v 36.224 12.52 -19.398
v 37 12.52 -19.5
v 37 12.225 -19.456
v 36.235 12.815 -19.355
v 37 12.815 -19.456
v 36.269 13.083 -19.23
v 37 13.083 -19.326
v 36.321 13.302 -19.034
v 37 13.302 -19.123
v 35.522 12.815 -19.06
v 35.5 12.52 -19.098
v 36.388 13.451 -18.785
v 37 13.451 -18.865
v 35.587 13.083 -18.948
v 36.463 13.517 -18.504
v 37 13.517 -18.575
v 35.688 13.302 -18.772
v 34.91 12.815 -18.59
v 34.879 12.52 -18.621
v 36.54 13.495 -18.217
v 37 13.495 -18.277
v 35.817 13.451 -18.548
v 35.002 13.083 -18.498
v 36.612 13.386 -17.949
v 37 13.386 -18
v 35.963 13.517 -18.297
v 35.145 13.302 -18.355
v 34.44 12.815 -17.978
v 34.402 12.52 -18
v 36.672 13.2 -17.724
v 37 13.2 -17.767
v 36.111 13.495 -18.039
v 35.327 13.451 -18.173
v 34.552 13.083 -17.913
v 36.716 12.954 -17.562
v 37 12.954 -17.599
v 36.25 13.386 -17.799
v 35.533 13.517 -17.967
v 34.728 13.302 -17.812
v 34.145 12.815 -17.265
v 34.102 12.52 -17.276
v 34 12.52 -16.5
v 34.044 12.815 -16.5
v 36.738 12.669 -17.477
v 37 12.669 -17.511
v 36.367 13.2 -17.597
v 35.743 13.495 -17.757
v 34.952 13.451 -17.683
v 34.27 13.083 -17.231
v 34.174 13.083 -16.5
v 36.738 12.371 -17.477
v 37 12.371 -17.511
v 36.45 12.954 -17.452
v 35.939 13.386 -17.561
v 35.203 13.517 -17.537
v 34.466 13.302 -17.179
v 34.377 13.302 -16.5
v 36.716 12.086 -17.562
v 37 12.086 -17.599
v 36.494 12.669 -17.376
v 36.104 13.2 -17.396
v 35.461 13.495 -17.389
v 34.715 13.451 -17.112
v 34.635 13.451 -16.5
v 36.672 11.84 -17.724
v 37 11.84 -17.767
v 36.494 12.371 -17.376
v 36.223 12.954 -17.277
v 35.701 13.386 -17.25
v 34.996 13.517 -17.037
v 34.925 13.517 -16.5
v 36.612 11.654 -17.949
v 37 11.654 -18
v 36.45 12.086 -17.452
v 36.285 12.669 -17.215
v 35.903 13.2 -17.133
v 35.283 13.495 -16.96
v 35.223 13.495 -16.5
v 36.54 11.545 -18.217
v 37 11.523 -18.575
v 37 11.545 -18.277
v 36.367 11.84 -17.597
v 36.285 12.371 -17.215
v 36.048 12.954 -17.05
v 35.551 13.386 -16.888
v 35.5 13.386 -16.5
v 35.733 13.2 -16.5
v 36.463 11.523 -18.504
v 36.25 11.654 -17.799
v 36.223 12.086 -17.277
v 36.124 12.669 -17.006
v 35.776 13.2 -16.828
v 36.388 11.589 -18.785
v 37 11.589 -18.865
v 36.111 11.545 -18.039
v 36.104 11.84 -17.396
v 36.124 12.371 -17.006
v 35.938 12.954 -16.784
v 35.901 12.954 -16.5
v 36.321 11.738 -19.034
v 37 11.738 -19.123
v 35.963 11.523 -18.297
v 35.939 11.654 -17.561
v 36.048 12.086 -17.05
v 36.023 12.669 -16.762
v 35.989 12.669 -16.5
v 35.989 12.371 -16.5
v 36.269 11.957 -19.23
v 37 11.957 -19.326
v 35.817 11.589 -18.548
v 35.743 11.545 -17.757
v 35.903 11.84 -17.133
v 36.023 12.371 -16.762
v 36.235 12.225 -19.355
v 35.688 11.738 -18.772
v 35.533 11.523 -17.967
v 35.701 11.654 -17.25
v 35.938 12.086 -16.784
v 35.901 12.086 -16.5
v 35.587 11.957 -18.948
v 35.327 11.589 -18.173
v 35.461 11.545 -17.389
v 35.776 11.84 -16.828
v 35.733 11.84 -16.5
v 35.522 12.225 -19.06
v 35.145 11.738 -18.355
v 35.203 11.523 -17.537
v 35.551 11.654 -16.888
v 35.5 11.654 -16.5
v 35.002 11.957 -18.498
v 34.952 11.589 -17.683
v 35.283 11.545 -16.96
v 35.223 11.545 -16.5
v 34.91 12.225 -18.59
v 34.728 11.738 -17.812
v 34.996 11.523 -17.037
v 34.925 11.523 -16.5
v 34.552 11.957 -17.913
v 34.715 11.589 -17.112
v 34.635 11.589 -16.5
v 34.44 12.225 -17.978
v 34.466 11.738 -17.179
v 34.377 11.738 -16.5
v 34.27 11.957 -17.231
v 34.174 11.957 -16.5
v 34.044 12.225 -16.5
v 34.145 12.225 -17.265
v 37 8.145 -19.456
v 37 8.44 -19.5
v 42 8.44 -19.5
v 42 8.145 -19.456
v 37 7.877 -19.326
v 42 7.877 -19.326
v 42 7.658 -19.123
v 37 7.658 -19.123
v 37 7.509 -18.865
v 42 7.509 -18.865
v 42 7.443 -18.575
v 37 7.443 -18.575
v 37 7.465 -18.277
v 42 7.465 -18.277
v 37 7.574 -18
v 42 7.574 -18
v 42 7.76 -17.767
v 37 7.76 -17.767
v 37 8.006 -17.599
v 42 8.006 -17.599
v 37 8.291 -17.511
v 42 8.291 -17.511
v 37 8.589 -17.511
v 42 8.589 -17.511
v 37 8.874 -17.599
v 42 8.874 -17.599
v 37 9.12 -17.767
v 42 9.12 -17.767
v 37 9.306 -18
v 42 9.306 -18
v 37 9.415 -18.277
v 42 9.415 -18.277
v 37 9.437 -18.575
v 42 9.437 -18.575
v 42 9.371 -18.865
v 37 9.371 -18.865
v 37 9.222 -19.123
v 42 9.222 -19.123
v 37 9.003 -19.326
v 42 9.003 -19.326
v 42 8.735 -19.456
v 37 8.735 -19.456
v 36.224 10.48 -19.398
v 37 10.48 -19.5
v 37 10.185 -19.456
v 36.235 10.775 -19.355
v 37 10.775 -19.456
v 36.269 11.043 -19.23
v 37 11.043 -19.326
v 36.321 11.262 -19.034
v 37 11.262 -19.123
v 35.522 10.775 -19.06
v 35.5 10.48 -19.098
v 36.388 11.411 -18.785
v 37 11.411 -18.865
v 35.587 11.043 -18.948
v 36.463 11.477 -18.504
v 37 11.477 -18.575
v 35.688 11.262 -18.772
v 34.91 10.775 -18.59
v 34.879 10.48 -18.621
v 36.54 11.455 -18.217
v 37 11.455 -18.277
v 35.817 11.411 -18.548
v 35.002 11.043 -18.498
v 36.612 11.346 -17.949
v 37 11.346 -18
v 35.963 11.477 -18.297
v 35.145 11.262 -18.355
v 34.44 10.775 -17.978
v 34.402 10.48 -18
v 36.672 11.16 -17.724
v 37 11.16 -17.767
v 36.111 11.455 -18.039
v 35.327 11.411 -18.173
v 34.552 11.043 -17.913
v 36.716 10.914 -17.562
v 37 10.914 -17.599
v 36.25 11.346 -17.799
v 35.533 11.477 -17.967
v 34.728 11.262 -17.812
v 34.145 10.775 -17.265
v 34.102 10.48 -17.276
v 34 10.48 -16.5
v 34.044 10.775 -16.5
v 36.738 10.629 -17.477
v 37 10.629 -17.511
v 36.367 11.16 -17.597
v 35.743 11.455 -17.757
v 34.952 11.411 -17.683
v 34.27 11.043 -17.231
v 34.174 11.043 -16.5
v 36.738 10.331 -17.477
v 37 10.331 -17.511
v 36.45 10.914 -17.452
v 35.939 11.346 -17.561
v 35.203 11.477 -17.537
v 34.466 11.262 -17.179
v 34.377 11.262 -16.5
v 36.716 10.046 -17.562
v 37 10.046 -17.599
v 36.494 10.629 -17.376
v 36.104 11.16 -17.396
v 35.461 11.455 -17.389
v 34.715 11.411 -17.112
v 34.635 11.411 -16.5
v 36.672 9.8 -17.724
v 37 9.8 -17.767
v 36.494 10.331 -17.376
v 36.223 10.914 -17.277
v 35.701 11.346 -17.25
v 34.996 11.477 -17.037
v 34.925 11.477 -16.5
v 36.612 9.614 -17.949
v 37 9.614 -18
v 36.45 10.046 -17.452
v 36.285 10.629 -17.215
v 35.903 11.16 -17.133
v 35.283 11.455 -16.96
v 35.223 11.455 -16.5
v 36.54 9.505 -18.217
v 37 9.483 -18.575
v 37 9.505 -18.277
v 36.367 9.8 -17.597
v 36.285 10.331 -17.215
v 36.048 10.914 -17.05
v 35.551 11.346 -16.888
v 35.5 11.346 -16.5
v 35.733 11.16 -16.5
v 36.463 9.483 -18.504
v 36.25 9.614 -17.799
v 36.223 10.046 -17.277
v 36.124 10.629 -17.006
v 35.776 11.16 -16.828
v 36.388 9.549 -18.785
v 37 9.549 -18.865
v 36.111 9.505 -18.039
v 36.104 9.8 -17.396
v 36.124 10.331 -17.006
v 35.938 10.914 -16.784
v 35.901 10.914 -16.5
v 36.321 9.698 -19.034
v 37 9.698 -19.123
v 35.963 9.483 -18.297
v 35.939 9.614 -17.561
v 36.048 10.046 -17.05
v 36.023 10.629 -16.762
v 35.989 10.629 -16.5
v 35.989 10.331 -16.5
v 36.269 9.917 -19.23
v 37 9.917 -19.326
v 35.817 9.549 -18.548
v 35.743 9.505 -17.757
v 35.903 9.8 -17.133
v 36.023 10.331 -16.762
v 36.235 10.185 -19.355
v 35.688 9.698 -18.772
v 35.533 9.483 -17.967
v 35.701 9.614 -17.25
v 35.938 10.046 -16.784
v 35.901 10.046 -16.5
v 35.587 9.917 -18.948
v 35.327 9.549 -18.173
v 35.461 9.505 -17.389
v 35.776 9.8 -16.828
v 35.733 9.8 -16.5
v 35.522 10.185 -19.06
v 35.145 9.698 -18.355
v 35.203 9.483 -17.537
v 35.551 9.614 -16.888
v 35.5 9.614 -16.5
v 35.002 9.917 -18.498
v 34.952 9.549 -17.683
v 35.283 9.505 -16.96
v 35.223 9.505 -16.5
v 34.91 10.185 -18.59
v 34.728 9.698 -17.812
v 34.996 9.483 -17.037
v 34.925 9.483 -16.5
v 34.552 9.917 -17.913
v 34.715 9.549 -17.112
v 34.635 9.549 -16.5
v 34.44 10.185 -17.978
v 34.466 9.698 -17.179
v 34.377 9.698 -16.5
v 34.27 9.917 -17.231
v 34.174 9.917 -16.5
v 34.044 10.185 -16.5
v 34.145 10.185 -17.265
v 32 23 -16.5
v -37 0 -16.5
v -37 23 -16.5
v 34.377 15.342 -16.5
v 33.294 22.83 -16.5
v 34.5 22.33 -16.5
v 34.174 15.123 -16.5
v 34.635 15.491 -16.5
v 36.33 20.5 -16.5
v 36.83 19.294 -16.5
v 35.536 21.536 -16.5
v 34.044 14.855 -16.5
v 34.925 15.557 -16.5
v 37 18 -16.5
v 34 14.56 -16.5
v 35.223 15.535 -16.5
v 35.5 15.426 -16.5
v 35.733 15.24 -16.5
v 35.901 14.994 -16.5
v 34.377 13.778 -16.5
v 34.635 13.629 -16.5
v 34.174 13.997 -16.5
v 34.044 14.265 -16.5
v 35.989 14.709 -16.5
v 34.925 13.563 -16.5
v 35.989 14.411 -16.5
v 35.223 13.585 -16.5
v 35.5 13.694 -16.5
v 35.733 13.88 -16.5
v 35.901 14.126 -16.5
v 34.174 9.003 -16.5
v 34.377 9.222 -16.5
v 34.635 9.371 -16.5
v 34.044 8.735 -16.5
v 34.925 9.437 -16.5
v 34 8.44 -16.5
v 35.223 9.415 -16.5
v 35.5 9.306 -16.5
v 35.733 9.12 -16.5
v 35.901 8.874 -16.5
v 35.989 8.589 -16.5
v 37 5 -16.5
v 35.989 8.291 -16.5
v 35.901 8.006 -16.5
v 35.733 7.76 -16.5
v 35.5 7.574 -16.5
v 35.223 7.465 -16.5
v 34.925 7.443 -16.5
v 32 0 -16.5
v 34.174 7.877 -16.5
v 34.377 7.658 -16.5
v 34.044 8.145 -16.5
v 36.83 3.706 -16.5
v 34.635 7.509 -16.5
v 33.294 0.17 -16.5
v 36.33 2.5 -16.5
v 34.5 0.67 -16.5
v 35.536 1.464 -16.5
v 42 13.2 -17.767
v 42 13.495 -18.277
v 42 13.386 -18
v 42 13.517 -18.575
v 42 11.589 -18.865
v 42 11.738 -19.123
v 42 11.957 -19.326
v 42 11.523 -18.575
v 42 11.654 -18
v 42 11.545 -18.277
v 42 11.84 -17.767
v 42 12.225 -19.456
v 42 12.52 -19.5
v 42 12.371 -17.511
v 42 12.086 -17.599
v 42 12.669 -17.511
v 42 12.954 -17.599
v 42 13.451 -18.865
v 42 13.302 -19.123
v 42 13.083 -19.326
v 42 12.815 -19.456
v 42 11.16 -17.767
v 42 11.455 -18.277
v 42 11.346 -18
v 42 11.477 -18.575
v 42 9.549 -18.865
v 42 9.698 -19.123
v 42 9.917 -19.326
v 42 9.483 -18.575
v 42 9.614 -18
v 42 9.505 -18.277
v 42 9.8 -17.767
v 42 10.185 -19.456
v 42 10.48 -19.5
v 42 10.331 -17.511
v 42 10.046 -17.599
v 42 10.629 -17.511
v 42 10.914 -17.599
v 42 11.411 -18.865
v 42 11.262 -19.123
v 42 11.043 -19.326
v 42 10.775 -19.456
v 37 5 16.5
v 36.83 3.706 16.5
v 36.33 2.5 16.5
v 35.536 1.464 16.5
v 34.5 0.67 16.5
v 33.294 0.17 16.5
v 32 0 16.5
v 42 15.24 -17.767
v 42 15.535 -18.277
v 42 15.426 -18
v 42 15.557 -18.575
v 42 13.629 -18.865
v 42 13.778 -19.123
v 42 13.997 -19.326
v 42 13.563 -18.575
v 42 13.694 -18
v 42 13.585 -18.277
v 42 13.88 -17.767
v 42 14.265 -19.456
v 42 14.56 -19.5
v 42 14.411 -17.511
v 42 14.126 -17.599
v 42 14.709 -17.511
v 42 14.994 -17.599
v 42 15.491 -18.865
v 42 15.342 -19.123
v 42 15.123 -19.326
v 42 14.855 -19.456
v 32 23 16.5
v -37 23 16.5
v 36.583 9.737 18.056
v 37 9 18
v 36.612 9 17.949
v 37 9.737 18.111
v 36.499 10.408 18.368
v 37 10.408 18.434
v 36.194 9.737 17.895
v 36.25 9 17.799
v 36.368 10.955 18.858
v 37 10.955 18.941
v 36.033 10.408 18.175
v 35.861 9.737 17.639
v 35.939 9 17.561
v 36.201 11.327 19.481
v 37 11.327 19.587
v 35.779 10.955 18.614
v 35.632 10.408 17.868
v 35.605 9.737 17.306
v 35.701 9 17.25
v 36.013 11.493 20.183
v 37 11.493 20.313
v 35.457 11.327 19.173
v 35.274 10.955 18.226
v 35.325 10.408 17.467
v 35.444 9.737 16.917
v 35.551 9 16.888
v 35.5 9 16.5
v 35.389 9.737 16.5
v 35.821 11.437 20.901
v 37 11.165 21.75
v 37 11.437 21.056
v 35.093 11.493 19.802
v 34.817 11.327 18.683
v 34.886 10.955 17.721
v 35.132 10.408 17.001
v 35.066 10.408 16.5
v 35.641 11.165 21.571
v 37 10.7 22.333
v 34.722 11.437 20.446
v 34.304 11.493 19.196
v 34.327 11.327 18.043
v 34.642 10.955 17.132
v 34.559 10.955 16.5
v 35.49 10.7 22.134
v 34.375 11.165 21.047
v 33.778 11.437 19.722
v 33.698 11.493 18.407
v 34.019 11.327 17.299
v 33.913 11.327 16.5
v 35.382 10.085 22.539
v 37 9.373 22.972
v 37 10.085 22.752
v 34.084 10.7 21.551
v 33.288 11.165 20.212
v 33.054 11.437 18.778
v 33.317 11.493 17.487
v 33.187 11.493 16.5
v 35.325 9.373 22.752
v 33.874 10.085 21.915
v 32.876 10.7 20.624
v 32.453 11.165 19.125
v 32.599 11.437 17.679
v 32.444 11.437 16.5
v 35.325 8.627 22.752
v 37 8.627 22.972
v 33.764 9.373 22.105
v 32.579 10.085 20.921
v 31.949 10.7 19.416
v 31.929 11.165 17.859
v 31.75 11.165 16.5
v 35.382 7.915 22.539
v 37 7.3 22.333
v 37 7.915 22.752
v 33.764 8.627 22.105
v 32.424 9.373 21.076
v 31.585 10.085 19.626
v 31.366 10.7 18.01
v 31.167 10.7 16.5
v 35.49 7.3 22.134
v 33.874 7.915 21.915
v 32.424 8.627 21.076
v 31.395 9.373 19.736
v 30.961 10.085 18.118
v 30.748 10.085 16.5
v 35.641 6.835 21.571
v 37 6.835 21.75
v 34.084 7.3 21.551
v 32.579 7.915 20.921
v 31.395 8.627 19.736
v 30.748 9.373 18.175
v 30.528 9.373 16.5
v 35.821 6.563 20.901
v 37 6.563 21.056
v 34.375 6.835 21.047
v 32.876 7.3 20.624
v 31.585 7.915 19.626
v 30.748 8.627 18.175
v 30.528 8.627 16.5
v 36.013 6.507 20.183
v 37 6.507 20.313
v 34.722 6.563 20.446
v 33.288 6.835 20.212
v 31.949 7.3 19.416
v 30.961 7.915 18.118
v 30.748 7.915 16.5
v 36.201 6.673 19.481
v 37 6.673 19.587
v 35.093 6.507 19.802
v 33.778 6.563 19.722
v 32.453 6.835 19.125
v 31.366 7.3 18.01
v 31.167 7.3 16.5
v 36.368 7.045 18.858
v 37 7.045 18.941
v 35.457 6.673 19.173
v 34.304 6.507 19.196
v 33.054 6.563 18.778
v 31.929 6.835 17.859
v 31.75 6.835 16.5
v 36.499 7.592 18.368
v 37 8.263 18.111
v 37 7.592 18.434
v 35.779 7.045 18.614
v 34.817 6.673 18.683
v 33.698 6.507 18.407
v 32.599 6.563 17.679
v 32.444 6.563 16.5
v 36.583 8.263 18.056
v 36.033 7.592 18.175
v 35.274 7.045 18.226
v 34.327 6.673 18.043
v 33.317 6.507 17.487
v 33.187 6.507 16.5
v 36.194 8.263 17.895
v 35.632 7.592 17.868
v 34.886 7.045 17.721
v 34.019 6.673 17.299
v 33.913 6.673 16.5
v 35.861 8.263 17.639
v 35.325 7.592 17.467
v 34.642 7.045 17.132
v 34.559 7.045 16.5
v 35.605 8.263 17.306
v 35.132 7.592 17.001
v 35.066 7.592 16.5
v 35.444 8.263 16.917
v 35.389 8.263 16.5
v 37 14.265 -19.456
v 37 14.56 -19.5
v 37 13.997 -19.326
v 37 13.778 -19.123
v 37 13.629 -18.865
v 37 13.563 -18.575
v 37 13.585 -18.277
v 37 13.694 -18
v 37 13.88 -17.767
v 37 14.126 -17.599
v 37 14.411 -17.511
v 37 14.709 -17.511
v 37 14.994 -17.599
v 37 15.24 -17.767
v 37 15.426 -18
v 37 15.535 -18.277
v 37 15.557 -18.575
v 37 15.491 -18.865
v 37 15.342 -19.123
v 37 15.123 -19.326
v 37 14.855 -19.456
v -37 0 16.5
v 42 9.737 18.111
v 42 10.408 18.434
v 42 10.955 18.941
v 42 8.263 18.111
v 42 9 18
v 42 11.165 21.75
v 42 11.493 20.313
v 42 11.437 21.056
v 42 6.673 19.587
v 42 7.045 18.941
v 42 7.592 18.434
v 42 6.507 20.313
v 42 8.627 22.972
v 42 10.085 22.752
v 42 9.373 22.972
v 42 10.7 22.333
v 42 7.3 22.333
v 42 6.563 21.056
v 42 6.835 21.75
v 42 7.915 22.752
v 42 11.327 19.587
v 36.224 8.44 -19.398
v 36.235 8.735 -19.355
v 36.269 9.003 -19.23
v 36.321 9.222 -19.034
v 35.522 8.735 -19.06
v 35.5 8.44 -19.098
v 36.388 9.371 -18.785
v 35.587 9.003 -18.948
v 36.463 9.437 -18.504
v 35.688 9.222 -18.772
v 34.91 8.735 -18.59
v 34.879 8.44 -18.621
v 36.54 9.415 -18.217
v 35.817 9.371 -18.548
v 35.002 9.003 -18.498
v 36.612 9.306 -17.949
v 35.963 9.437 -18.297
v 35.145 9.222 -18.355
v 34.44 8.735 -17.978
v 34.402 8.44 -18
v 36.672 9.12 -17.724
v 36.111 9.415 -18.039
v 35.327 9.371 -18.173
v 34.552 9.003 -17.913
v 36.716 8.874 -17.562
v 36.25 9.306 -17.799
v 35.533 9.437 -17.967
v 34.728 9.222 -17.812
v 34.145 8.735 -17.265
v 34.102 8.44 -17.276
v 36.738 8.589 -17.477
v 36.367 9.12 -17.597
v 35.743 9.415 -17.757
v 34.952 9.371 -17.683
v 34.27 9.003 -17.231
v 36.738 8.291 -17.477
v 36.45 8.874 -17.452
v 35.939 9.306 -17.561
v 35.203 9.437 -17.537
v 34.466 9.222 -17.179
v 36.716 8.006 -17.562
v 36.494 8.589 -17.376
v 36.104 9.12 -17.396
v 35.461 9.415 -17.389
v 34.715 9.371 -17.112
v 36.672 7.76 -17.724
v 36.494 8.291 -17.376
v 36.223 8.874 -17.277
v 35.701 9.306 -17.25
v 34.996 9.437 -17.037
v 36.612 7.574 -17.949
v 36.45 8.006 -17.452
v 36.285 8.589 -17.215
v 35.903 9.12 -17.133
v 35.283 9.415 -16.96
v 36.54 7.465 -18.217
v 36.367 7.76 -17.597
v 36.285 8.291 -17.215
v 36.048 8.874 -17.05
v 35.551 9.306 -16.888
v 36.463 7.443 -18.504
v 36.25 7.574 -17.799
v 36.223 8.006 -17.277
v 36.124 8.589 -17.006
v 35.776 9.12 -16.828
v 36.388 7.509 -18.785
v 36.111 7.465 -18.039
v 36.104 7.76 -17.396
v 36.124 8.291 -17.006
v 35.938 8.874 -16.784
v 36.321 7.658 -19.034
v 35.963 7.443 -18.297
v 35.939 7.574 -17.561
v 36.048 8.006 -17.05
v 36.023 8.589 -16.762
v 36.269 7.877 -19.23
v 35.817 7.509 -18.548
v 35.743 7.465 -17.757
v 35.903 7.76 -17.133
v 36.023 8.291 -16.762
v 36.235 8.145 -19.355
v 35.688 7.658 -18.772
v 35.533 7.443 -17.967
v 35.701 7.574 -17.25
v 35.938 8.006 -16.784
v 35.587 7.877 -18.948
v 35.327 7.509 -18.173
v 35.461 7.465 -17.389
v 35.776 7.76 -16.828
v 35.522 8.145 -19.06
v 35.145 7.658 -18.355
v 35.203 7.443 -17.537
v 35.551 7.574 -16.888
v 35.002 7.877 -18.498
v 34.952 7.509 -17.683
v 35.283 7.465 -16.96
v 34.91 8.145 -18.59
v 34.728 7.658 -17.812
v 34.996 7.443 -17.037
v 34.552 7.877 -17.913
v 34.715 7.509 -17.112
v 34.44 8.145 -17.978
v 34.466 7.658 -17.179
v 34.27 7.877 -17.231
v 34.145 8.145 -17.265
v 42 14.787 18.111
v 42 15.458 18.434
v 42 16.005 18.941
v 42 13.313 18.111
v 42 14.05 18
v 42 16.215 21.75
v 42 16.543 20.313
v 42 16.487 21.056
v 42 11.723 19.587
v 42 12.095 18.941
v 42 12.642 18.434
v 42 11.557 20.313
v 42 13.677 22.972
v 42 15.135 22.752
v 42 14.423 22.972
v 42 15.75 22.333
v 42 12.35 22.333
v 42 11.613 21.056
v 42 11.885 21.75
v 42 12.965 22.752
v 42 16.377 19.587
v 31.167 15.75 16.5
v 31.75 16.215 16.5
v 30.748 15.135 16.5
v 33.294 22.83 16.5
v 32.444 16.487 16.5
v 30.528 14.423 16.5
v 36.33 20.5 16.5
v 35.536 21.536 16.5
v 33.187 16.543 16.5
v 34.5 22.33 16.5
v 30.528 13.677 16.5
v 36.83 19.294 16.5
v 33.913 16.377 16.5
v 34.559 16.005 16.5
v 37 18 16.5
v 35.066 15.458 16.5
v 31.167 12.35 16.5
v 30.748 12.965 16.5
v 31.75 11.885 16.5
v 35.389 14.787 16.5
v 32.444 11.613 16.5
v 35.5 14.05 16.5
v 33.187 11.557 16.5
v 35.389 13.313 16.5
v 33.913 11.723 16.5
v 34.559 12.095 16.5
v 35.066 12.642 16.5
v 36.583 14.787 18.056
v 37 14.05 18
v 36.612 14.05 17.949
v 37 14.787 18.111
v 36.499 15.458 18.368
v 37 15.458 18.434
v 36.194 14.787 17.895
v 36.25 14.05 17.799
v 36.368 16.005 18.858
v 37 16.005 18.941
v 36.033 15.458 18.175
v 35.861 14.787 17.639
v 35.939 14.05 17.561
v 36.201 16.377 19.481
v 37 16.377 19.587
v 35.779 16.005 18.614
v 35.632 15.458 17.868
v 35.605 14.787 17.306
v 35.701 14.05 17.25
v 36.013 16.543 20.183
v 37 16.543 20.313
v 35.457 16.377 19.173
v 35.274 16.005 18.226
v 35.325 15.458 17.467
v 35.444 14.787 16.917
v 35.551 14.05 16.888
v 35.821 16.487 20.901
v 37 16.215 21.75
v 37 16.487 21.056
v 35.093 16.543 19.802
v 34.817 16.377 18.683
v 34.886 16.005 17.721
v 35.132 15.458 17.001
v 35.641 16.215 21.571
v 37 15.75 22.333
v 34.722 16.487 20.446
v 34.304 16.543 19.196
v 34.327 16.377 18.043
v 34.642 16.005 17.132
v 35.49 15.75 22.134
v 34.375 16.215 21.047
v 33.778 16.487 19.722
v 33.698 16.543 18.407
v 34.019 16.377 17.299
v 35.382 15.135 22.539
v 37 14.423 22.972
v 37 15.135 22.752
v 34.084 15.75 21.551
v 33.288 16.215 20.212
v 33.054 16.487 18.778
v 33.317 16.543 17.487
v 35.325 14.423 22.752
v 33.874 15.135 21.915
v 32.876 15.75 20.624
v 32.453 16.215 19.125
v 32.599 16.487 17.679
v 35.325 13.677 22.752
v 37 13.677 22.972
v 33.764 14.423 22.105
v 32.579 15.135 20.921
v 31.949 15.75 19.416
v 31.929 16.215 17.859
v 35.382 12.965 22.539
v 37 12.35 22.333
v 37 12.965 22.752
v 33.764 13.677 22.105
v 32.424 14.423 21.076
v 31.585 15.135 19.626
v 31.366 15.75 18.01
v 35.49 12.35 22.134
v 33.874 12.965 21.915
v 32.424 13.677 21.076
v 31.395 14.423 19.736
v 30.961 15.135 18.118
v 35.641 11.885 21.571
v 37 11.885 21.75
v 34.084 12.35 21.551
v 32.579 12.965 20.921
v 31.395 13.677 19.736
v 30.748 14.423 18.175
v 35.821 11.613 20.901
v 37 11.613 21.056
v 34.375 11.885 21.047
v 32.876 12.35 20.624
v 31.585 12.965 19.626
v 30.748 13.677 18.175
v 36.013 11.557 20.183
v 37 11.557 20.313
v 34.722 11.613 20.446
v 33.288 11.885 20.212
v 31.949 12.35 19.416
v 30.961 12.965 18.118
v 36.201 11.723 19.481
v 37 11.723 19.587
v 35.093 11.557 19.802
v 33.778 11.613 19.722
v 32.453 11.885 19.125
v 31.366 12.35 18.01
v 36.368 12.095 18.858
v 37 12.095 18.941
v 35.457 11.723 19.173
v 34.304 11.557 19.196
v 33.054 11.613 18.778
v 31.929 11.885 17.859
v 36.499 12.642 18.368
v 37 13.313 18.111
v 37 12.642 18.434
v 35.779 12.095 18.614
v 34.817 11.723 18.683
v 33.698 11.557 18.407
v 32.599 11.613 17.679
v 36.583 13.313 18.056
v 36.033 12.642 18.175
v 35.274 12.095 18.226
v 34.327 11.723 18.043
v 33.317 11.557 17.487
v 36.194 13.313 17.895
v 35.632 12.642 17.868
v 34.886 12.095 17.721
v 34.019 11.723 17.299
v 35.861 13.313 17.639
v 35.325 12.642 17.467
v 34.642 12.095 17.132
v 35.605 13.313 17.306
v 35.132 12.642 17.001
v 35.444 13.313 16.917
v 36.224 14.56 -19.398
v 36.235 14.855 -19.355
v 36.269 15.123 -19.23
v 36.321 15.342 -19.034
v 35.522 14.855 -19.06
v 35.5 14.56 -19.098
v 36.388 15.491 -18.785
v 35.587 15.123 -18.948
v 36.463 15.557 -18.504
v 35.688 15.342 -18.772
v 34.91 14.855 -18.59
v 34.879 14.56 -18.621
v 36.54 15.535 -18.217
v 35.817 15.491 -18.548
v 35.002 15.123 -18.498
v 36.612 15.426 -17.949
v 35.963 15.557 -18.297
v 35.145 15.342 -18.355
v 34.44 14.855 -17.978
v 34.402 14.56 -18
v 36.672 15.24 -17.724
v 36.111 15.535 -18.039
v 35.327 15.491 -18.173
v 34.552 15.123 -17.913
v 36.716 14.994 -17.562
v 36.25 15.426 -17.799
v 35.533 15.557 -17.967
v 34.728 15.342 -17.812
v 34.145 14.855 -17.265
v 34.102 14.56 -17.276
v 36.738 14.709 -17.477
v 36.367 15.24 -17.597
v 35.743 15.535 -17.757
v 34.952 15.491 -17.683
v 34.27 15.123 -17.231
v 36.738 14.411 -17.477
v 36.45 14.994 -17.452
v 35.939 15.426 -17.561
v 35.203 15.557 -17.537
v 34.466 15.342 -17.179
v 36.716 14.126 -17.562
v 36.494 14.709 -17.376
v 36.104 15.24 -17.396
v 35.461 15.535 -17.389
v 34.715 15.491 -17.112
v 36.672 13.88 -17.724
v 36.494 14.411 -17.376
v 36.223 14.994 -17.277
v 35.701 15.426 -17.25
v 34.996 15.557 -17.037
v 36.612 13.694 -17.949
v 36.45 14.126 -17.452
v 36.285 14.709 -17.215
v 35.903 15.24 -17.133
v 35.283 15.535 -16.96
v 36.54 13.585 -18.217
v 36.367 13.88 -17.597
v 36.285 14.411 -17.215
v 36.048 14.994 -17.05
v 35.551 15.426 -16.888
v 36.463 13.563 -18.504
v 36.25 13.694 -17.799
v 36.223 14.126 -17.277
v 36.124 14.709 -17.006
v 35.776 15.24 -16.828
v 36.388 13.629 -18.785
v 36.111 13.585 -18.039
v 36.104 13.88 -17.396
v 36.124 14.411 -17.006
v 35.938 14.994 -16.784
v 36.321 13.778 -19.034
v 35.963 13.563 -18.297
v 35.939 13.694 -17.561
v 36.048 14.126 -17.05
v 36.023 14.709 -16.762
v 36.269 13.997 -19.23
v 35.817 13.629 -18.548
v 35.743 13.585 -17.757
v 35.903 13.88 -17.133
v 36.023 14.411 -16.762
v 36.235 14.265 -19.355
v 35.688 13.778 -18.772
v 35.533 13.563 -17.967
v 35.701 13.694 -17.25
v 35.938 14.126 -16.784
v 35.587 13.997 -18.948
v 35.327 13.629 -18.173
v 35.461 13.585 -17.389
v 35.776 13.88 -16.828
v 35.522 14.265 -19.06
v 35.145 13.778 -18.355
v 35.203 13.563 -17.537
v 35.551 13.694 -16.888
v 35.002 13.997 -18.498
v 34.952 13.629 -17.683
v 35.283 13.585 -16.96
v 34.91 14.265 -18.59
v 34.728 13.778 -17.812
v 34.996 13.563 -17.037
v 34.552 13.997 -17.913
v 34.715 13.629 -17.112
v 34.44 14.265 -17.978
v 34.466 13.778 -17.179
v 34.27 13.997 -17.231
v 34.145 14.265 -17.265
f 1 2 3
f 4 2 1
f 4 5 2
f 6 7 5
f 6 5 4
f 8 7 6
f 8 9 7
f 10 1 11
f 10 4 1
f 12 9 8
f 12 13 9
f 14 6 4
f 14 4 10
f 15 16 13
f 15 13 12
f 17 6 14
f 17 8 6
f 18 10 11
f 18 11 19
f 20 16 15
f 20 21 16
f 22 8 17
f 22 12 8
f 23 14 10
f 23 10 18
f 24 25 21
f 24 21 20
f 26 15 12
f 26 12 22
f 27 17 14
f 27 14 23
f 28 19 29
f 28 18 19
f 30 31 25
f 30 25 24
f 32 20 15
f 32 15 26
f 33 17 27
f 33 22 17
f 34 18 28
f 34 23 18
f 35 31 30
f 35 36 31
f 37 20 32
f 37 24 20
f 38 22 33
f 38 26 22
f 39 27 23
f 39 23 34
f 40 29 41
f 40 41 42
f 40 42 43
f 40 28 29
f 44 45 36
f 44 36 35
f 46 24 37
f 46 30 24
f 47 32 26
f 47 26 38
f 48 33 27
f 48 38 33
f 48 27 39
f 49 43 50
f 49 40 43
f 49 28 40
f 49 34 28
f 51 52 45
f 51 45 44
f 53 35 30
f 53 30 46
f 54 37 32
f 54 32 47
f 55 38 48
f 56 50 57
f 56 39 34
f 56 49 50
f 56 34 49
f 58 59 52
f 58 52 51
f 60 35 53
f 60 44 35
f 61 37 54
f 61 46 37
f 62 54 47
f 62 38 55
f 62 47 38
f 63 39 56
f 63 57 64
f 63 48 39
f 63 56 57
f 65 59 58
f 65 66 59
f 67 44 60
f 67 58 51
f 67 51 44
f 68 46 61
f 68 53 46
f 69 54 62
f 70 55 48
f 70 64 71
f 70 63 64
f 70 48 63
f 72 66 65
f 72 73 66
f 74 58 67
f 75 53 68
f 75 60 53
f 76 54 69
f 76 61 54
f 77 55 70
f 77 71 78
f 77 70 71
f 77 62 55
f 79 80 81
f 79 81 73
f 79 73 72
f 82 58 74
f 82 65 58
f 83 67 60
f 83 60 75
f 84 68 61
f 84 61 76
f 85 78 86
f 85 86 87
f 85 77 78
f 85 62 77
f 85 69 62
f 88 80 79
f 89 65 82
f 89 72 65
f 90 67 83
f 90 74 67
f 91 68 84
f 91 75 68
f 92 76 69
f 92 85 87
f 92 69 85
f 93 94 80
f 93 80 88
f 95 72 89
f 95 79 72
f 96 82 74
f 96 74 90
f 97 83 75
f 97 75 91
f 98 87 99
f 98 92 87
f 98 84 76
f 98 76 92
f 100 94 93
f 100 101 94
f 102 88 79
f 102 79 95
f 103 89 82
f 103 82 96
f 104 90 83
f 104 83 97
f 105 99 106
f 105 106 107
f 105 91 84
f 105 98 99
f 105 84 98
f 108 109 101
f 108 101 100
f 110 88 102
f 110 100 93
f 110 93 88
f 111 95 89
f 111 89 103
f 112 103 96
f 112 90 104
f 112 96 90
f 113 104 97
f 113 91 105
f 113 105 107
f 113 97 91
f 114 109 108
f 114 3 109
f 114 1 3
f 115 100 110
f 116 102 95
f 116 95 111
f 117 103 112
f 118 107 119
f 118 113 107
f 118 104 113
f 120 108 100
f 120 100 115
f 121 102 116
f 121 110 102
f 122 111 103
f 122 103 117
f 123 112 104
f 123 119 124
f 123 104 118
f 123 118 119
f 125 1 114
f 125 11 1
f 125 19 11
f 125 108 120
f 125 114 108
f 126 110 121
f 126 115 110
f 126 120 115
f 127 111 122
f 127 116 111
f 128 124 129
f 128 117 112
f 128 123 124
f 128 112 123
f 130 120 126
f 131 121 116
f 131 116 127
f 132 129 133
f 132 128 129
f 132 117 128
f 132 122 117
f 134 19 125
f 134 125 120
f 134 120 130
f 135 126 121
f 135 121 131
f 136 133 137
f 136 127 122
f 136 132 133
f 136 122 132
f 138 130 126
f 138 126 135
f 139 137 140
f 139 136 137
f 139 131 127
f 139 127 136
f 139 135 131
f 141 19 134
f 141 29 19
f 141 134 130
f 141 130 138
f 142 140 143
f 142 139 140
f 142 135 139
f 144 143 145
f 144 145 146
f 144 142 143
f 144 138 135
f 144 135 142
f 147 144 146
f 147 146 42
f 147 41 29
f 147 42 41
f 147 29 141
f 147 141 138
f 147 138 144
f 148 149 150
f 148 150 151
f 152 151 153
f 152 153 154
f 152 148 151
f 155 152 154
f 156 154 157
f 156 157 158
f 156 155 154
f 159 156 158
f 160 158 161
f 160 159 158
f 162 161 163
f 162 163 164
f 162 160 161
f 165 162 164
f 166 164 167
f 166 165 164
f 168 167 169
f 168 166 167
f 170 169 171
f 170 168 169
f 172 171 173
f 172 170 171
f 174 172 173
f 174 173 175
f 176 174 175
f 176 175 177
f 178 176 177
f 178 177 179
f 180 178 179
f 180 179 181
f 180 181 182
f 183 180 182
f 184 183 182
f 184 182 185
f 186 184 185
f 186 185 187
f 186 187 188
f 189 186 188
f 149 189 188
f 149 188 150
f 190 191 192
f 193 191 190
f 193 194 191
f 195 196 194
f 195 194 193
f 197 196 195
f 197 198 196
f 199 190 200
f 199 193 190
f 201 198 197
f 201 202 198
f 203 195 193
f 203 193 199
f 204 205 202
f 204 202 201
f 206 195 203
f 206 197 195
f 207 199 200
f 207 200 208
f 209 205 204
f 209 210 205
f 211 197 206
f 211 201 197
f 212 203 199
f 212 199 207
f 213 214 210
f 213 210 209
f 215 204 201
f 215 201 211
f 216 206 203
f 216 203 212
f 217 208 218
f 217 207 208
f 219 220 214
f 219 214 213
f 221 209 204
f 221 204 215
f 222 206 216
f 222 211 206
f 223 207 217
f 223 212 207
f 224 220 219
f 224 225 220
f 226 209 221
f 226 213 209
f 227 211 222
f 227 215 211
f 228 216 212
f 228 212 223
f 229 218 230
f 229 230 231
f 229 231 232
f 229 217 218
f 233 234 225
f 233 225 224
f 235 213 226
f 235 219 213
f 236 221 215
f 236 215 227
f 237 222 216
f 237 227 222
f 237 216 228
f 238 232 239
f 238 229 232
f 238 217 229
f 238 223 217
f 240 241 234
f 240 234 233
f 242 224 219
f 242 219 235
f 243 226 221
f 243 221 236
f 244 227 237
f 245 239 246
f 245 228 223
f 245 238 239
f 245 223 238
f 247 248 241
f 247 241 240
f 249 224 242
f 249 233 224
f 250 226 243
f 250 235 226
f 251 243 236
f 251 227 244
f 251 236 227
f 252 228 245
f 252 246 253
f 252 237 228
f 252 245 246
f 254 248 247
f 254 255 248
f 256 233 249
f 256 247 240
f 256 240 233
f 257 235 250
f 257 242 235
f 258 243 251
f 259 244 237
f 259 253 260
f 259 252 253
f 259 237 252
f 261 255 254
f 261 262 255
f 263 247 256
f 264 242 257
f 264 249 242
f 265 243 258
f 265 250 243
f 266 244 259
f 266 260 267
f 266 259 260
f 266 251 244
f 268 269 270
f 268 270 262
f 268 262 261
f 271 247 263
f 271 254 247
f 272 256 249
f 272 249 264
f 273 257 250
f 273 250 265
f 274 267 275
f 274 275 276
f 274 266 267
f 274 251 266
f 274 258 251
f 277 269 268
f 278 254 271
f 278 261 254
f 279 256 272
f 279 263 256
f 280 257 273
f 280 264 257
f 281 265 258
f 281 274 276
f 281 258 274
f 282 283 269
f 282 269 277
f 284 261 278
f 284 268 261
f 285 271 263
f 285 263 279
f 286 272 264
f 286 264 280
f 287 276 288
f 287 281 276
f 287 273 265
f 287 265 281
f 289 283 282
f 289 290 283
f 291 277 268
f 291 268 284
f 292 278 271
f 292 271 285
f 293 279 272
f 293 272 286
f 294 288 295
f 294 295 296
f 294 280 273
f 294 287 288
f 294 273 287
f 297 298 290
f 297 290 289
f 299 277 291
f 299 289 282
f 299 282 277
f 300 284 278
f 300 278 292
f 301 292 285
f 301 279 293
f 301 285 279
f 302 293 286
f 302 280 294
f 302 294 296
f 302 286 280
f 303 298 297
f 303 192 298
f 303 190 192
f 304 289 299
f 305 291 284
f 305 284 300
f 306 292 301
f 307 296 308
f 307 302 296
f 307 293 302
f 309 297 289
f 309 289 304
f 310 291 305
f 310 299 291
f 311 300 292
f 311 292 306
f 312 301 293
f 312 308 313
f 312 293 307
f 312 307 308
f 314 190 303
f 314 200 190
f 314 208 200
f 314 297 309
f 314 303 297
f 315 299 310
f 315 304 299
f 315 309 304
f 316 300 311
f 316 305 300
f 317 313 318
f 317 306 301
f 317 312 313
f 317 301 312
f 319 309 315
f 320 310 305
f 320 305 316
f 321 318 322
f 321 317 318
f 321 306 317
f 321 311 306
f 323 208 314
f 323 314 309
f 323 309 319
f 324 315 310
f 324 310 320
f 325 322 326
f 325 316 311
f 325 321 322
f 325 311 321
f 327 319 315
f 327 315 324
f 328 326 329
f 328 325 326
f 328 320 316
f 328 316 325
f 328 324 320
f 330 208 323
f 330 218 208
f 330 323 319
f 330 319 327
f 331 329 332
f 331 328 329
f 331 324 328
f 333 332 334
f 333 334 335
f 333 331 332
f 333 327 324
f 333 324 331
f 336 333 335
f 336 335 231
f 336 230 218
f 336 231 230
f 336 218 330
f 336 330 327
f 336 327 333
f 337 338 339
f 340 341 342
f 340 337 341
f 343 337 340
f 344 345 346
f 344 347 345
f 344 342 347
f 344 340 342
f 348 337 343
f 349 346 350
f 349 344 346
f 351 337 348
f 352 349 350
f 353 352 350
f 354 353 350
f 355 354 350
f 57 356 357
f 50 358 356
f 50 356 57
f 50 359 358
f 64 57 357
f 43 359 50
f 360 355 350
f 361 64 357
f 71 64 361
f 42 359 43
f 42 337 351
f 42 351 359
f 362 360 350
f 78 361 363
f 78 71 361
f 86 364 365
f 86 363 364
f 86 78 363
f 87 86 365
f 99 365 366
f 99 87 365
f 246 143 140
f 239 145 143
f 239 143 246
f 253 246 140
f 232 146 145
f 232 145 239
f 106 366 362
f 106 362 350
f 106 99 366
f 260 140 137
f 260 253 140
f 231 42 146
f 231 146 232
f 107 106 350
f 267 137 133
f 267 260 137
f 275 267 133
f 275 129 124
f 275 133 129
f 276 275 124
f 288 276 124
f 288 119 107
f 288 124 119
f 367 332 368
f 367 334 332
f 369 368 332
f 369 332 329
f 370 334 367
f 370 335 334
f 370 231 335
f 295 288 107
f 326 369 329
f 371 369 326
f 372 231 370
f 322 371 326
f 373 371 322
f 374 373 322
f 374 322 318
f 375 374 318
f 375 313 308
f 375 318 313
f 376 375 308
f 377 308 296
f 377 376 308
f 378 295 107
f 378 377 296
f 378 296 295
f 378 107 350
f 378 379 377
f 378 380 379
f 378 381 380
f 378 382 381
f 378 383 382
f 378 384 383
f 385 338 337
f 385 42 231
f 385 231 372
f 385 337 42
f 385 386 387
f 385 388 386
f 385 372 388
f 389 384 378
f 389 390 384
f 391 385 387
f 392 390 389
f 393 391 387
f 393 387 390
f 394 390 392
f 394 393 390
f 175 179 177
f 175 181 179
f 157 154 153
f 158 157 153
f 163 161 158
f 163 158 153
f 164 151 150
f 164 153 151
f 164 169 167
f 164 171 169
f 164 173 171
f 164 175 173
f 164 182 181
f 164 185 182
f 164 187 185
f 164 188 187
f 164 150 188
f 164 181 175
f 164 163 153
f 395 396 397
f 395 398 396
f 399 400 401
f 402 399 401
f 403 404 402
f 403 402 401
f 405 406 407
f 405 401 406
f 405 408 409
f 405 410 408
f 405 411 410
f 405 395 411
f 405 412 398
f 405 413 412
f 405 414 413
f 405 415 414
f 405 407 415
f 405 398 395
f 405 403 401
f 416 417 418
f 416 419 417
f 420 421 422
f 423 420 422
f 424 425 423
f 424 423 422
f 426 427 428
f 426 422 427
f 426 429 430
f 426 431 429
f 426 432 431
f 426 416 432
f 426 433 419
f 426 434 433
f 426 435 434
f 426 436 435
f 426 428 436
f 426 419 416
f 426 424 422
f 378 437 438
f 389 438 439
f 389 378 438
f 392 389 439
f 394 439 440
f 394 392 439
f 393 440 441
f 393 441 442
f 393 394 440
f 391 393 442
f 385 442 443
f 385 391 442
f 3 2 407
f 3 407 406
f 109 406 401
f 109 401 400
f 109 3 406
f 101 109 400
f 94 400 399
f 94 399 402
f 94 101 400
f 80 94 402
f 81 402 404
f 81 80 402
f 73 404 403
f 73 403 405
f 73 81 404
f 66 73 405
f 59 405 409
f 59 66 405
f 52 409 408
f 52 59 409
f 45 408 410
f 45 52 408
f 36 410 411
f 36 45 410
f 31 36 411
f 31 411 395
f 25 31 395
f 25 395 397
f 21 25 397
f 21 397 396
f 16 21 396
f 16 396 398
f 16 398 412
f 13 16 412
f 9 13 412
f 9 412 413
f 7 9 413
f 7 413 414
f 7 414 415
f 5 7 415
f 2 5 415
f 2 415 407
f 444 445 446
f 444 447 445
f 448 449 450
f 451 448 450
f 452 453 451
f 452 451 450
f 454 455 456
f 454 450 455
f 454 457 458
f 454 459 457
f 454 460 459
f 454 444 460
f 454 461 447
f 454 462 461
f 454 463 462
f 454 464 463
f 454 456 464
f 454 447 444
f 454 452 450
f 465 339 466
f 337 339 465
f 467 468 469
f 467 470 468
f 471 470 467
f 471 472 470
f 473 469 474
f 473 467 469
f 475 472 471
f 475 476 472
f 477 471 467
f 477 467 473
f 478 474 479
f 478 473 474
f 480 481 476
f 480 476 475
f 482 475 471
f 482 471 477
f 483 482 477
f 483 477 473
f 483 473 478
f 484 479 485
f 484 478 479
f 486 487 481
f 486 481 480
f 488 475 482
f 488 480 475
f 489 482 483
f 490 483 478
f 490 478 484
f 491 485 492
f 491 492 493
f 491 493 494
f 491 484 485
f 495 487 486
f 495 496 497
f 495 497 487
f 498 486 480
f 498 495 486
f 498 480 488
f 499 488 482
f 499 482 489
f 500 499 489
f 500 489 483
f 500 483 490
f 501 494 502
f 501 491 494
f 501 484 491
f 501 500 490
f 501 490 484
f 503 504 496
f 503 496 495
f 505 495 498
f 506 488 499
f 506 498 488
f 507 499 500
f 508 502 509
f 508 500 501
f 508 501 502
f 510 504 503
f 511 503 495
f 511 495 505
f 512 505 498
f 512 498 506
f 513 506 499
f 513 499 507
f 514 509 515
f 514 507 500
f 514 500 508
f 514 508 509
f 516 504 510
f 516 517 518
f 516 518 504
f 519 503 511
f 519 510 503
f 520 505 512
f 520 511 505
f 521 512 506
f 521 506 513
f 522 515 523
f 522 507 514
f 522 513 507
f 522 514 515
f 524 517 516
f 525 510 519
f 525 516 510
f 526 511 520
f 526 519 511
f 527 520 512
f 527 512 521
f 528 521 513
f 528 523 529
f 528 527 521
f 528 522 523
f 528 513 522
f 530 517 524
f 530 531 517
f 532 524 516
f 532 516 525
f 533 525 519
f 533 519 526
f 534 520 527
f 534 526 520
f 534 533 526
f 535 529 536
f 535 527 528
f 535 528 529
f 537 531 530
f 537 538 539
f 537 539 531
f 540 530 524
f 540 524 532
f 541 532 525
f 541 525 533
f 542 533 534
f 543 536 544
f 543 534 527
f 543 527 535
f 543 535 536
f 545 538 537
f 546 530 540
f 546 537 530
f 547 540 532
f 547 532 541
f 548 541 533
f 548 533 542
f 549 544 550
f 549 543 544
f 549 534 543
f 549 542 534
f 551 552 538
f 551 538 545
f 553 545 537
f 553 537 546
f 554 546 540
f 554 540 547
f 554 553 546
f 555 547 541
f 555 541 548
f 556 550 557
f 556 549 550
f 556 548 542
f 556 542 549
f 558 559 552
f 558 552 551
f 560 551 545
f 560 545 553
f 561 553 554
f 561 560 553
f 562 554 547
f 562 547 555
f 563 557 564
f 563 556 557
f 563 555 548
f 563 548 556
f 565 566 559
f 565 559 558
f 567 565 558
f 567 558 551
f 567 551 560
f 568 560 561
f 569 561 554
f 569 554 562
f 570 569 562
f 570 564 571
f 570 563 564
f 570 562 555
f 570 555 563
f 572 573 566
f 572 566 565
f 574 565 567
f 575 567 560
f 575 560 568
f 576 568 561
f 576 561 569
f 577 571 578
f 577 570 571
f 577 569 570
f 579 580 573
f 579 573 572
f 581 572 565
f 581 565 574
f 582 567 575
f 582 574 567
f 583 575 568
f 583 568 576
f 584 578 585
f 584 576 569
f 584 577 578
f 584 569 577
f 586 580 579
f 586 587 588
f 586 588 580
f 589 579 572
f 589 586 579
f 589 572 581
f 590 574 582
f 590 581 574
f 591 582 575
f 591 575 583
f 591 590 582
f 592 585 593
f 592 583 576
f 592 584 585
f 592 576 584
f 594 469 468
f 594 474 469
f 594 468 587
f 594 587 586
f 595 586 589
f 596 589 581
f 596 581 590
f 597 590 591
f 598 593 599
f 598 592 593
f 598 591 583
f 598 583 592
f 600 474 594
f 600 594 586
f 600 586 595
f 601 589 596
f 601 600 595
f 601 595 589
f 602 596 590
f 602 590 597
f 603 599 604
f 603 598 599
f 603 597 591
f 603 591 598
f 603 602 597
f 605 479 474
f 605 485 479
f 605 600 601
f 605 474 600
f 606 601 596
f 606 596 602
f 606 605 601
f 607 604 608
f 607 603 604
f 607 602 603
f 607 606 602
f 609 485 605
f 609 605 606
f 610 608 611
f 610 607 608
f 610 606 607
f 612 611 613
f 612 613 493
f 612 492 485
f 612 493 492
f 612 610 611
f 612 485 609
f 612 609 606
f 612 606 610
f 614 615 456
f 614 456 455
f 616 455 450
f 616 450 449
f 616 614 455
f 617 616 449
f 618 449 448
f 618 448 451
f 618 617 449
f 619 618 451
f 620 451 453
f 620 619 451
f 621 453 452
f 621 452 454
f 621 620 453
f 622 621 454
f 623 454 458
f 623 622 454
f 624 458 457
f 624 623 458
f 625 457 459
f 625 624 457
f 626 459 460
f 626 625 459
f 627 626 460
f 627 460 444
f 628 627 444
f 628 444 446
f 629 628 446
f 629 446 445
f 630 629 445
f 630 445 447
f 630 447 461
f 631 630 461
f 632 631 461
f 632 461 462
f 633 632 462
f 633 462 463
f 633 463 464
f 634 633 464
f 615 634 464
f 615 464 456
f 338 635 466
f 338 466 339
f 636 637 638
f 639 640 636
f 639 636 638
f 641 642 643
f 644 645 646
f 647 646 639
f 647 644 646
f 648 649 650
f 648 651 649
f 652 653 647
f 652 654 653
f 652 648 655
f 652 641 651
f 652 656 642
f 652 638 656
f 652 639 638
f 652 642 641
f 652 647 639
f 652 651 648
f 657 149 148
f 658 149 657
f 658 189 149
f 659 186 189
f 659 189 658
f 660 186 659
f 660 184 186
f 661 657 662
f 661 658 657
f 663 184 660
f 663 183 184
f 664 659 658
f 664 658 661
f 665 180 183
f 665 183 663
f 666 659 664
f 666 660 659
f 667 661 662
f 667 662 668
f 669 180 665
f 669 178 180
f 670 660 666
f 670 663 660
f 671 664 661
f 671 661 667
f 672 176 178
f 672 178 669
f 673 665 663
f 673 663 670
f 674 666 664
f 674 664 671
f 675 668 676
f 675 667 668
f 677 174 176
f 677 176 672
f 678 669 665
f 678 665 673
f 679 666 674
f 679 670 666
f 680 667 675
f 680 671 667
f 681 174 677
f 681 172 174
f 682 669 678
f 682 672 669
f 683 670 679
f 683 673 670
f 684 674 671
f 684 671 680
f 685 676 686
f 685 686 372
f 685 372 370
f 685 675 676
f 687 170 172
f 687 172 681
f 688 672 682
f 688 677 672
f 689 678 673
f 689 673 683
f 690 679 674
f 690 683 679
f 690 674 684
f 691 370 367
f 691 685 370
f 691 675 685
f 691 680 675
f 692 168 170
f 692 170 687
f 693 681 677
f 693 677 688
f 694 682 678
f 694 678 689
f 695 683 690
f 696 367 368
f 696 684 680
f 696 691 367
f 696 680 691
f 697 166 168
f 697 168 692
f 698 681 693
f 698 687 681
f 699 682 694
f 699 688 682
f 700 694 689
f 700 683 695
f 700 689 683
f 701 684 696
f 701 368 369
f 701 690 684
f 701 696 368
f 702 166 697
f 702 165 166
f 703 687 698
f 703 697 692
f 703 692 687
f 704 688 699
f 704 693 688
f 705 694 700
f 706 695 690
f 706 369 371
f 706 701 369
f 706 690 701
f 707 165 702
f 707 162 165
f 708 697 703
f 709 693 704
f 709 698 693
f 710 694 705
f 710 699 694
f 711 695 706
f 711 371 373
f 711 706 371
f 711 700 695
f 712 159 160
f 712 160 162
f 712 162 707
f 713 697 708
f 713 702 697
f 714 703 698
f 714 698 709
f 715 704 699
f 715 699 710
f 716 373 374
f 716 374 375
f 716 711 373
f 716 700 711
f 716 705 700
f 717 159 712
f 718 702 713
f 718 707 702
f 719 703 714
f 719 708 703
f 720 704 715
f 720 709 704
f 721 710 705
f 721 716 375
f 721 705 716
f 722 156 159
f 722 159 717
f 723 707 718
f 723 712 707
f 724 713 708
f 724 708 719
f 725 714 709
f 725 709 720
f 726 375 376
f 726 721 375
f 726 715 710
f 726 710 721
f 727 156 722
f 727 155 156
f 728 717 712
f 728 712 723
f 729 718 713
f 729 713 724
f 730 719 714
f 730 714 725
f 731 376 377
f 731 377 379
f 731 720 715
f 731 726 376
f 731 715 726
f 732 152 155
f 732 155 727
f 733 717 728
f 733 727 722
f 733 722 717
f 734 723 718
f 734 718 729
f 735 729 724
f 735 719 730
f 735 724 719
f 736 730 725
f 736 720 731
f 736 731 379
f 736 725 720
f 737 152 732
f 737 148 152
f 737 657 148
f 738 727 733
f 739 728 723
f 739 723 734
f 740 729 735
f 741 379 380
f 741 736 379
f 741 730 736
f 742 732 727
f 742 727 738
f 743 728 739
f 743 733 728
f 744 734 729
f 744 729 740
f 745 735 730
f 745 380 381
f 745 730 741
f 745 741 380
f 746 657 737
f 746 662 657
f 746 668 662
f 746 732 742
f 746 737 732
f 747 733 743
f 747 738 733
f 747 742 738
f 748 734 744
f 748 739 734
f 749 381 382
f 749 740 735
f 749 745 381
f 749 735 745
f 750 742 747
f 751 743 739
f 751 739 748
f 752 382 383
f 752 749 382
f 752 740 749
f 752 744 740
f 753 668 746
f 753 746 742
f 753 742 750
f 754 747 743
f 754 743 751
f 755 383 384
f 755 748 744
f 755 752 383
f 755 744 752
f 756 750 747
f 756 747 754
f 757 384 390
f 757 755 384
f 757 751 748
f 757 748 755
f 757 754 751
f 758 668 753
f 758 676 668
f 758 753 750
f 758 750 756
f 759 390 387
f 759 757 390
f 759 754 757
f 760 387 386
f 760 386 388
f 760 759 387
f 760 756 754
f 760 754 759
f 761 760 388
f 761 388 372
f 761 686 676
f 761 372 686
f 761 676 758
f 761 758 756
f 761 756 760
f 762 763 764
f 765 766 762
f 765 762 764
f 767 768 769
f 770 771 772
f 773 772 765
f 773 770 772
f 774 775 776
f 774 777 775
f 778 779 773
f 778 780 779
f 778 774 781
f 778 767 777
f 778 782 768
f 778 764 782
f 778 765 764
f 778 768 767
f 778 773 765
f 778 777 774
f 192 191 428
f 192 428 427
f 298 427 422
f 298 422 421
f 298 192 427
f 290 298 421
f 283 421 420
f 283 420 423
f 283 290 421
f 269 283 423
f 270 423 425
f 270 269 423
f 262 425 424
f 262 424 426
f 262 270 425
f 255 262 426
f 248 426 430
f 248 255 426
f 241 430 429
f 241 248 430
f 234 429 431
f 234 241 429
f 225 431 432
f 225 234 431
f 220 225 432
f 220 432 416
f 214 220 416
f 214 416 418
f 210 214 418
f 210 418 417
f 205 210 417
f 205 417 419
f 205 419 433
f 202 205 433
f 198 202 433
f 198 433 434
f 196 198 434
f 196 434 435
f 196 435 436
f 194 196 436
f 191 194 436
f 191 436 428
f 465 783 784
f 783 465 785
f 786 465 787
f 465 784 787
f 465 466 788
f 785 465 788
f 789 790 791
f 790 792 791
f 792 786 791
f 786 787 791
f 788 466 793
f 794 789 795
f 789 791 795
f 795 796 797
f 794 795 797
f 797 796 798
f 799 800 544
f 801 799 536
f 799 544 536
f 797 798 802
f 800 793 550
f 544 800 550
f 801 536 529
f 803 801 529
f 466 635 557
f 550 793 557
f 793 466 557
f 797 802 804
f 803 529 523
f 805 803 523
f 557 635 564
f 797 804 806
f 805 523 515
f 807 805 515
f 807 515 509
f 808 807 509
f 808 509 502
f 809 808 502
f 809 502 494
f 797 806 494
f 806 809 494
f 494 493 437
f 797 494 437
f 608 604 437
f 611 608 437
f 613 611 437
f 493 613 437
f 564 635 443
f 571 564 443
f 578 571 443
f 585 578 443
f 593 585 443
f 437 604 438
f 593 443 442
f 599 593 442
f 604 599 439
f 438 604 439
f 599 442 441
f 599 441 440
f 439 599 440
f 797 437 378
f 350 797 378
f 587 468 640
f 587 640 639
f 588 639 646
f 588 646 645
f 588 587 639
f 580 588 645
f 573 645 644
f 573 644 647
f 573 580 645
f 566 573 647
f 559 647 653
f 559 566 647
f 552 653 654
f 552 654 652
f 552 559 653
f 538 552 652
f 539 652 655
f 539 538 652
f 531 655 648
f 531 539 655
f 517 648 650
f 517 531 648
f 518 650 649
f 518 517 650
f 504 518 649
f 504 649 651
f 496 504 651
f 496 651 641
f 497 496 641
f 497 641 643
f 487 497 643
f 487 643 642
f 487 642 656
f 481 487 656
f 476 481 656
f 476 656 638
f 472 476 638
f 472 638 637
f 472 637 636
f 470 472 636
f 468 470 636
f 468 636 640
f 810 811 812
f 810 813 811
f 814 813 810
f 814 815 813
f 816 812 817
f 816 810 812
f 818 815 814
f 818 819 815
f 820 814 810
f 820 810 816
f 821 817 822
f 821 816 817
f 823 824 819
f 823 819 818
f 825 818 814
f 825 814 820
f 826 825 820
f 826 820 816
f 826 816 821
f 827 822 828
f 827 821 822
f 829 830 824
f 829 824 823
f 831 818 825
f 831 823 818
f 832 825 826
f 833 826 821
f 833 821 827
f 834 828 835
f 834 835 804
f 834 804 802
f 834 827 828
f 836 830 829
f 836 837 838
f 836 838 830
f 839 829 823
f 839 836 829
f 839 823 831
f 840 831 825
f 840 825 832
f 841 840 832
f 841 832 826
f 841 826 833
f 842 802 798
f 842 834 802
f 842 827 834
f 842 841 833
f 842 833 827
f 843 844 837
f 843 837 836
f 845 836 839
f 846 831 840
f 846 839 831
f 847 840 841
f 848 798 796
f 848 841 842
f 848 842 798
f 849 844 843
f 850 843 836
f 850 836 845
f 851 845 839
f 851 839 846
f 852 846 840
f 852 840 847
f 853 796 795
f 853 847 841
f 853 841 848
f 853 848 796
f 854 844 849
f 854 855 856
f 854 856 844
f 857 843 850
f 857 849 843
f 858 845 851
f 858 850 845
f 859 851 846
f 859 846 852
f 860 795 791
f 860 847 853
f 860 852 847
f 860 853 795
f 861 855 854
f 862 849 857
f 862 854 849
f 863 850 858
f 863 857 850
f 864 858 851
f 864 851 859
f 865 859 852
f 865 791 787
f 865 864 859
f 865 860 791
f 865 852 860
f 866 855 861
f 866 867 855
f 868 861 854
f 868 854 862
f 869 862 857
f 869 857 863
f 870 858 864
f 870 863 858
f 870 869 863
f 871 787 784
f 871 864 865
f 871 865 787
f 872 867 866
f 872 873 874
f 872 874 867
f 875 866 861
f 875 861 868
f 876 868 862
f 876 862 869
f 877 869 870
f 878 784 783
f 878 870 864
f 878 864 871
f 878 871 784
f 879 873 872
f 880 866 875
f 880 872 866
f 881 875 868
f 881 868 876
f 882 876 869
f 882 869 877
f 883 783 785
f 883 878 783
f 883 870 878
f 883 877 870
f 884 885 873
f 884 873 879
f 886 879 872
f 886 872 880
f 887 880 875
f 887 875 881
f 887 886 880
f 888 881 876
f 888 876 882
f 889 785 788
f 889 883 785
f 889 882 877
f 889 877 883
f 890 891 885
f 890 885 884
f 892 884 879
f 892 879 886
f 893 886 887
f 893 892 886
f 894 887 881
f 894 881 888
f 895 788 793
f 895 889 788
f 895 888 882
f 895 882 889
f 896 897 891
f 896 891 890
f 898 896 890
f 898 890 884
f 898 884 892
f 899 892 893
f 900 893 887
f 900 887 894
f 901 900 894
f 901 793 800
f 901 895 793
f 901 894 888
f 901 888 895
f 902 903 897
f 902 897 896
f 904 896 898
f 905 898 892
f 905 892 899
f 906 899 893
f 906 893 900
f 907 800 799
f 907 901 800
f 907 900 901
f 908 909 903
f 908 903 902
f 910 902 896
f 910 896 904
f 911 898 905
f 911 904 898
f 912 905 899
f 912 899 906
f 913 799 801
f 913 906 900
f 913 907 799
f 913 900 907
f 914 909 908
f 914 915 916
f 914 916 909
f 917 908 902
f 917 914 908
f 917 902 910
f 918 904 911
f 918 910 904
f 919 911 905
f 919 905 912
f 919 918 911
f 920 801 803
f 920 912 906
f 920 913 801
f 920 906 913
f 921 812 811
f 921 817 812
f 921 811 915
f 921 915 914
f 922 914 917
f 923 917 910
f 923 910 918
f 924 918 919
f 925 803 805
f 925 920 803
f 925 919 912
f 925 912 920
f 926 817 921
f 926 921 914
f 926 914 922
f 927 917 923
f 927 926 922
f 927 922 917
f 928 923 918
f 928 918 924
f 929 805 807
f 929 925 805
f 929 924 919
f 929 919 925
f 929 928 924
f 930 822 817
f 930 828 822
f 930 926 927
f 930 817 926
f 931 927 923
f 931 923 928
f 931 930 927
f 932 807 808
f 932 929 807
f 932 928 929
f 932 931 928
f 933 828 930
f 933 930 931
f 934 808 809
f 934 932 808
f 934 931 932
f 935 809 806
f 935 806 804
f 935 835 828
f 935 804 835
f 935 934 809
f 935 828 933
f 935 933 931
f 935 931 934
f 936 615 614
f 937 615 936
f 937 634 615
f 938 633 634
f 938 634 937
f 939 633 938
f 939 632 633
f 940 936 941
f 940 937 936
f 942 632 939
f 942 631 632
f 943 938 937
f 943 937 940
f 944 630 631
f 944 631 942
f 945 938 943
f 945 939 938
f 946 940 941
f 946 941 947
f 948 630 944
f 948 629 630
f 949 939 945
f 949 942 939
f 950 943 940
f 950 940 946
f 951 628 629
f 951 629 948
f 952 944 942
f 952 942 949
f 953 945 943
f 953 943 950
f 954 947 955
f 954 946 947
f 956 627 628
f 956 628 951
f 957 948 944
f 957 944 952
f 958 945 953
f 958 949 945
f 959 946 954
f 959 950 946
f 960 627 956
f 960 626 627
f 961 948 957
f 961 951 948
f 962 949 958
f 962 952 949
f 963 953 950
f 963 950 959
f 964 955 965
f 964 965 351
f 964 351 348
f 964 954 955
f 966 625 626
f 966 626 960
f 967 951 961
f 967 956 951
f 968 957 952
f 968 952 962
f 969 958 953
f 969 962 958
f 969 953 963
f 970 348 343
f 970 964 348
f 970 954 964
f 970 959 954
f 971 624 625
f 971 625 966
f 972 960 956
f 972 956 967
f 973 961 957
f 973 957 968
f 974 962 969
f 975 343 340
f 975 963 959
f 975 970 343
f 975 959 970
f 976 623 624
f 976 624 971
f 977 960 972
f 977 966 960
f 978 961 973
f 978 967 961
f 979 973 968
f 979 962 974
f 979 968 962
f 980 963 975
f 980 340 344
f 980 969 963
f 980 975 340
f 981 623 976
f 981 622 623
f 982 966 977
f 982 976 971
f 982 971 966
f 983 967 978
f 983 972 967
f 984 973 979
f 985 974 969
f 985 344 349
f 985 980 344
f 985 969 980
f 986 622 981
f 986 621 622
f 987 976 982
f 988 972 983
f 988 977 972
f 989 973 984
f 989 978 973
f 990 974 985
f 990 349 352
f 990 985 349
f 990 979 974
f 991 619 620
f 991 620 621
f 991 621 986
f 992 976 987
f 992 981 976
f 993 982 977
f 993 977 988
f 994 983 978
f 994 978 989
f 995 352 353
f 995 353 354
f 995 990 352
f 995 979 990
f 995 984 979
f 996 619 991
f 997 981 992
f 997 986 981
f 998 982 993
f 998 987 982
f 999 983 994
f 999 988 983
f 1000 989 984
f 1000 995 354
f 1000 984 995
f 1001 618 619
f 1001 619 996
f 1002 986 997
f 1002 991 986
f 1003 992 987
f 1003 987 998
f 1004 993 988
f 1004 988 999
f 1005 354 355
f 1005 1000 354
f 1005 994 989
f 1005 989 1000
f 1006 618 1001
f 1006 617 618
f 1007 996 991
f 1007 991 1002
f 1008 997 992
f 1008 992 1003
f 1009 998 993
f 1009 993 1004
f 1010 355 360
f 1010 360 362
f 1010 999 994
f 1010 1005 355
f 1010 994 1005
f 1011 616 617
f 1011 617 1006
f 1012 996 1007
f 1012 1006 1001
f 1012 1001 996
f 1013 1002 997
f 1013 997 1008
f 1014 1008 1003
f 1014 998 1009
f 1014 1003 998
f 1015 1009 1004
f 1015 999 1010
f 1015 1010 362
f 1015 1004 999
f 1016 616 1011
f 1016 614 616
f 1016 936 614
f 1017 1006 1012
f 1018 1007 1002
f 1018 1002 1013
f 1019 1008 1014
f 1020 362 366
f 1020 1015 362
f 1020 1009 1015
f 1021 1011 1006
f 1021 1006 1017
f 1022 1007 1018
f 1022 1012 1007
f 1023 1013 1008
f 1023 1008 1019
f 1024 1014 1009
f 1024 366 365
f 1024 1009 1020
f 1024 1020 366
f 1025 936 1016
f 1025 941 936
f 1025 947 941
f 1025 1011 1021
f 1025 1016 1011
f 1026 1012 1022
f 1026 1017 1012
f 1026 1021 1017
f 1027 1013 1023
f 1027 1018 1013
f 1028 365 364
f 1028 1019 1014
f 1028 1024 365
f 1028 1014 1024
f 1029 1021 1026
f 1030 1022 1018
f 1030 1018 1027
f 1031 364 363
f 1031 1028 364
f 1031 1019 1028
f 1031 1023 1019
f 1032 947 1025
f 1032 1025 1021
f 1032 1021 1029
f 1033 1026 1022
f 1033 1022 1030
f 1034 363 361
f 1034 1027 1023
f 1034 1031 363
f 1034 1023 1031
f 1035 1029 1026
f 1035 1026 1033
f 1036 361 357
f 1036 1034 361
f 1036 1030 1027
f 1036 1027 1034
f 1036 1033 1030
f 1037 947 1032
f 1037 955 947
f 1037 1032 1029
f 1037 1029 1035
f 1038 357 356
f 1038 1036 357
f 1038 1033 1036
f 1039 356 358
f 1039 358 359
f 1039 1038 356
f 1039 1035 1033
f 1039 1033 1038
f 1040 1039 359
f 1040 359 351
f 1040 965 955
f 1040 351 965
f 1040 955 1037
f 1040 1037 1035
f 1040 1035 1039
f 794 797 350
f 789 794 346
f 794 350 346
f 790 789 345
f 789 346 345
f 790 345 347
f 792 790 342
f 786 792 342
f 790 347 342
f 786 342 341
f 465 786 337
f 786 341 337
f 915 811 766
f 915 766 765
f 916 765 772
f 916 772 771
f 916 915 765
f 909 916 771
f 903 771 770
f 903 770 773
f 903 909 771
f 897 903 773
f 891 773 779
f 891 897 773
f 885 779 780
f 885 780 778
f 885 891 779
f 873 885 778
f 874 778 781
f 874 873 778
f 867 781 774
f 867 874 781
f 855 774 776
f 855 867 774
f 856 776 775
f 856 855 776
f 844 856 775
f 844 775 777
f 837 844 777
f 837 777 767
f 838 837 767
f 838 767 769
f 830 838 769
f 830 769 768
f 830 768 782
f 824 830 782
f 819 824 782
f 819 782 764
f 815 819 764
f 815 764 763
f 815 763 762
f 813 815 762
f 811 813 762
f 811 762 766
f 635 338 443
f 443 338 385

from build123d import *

# Parameters (mm, degrees)
SKETCH1_W           = 74
SKETCH1_H           = 33
BOSS_EXTRUDE1_DEPTH = 23
FILLET1_R           = 5
SKETCH2_R           = 2.5
SKETCH9_R           = 1


with BuildPart() as part:
    # Sketch1 → Boss-Extrude1 (new body)
    with BuildSketch(Plane(origin=(0, 0, 0), x_dir=(1, 0, 0), z_dir=(0, 1, 0))):
        Rectangle(SKETCH1_W, SKETCH1_H)
    extrude(amount=BOSS_EXTRUDE1_DEPTH)

    # Fillet1
    fillet1_edges = [part.edges().sort_by_distance(p)[0] for p in [
        (37, 23, 0),
        (37, 0, 0),
    ]]
    fillet(fillet1_edges, radius=FILLET1_R)

    # Sweep5: sweep along a path in Sketch7
    with BuildLine(Plane(origin=(0, 0, 0), x_dir=(-1, 0, 0), z_dir=(0, -1, 0))) as sweep5_path:
        Line((-42, -20.5), (-37, -20.5))
        ThreePointArc((-37, -20.5), (-34.171572875, -19.328427125), (-33, -16.5))
    # Sketch2 → Sweep5 (sweep)
    with BuildSketch(Plane.XY.offset(16.5)):
        with Locations((33, 14.05)):
            Circle(SKETCH2_R)
        with Locations((33, 9)):
            Circle(SKETCH2_R)
    sweep(path=sweep5_path.line)

    # Sweep6: sweep along a path in Sketch10
    with BuildLine(Plane(origin=(0, 0, 0), x_dir=(1, 0, 0), z_dir=(0, 1, 0))) as sweep6_path:
        Line((42, 18.5), (37, 18.5))
        ThreePointArc((37, 18.5), (35.585786438, 17.914213562), (35, 16.5))
    # Sketch9 → Sweep6 (sweep)
    with BuildSketch(Plane(origin=(0, 0, -16.5), x_dir=(-1, 0, 0), z_dir=(0, 0, -1))):
        with Locations((-35, 12.52)):
            Circle(SKETCH9_R)
        with Locations((-35, 10.48)):
            Circle(SKETCH9_R)
        with Locations((-35, 14.56)):
            Circle(SKETCH9_R)
        with Locations((-35, 8.44)):
            Circle(SKETCH9_R)
    sweep(path=sweep6_path.line)


solid = part.part
